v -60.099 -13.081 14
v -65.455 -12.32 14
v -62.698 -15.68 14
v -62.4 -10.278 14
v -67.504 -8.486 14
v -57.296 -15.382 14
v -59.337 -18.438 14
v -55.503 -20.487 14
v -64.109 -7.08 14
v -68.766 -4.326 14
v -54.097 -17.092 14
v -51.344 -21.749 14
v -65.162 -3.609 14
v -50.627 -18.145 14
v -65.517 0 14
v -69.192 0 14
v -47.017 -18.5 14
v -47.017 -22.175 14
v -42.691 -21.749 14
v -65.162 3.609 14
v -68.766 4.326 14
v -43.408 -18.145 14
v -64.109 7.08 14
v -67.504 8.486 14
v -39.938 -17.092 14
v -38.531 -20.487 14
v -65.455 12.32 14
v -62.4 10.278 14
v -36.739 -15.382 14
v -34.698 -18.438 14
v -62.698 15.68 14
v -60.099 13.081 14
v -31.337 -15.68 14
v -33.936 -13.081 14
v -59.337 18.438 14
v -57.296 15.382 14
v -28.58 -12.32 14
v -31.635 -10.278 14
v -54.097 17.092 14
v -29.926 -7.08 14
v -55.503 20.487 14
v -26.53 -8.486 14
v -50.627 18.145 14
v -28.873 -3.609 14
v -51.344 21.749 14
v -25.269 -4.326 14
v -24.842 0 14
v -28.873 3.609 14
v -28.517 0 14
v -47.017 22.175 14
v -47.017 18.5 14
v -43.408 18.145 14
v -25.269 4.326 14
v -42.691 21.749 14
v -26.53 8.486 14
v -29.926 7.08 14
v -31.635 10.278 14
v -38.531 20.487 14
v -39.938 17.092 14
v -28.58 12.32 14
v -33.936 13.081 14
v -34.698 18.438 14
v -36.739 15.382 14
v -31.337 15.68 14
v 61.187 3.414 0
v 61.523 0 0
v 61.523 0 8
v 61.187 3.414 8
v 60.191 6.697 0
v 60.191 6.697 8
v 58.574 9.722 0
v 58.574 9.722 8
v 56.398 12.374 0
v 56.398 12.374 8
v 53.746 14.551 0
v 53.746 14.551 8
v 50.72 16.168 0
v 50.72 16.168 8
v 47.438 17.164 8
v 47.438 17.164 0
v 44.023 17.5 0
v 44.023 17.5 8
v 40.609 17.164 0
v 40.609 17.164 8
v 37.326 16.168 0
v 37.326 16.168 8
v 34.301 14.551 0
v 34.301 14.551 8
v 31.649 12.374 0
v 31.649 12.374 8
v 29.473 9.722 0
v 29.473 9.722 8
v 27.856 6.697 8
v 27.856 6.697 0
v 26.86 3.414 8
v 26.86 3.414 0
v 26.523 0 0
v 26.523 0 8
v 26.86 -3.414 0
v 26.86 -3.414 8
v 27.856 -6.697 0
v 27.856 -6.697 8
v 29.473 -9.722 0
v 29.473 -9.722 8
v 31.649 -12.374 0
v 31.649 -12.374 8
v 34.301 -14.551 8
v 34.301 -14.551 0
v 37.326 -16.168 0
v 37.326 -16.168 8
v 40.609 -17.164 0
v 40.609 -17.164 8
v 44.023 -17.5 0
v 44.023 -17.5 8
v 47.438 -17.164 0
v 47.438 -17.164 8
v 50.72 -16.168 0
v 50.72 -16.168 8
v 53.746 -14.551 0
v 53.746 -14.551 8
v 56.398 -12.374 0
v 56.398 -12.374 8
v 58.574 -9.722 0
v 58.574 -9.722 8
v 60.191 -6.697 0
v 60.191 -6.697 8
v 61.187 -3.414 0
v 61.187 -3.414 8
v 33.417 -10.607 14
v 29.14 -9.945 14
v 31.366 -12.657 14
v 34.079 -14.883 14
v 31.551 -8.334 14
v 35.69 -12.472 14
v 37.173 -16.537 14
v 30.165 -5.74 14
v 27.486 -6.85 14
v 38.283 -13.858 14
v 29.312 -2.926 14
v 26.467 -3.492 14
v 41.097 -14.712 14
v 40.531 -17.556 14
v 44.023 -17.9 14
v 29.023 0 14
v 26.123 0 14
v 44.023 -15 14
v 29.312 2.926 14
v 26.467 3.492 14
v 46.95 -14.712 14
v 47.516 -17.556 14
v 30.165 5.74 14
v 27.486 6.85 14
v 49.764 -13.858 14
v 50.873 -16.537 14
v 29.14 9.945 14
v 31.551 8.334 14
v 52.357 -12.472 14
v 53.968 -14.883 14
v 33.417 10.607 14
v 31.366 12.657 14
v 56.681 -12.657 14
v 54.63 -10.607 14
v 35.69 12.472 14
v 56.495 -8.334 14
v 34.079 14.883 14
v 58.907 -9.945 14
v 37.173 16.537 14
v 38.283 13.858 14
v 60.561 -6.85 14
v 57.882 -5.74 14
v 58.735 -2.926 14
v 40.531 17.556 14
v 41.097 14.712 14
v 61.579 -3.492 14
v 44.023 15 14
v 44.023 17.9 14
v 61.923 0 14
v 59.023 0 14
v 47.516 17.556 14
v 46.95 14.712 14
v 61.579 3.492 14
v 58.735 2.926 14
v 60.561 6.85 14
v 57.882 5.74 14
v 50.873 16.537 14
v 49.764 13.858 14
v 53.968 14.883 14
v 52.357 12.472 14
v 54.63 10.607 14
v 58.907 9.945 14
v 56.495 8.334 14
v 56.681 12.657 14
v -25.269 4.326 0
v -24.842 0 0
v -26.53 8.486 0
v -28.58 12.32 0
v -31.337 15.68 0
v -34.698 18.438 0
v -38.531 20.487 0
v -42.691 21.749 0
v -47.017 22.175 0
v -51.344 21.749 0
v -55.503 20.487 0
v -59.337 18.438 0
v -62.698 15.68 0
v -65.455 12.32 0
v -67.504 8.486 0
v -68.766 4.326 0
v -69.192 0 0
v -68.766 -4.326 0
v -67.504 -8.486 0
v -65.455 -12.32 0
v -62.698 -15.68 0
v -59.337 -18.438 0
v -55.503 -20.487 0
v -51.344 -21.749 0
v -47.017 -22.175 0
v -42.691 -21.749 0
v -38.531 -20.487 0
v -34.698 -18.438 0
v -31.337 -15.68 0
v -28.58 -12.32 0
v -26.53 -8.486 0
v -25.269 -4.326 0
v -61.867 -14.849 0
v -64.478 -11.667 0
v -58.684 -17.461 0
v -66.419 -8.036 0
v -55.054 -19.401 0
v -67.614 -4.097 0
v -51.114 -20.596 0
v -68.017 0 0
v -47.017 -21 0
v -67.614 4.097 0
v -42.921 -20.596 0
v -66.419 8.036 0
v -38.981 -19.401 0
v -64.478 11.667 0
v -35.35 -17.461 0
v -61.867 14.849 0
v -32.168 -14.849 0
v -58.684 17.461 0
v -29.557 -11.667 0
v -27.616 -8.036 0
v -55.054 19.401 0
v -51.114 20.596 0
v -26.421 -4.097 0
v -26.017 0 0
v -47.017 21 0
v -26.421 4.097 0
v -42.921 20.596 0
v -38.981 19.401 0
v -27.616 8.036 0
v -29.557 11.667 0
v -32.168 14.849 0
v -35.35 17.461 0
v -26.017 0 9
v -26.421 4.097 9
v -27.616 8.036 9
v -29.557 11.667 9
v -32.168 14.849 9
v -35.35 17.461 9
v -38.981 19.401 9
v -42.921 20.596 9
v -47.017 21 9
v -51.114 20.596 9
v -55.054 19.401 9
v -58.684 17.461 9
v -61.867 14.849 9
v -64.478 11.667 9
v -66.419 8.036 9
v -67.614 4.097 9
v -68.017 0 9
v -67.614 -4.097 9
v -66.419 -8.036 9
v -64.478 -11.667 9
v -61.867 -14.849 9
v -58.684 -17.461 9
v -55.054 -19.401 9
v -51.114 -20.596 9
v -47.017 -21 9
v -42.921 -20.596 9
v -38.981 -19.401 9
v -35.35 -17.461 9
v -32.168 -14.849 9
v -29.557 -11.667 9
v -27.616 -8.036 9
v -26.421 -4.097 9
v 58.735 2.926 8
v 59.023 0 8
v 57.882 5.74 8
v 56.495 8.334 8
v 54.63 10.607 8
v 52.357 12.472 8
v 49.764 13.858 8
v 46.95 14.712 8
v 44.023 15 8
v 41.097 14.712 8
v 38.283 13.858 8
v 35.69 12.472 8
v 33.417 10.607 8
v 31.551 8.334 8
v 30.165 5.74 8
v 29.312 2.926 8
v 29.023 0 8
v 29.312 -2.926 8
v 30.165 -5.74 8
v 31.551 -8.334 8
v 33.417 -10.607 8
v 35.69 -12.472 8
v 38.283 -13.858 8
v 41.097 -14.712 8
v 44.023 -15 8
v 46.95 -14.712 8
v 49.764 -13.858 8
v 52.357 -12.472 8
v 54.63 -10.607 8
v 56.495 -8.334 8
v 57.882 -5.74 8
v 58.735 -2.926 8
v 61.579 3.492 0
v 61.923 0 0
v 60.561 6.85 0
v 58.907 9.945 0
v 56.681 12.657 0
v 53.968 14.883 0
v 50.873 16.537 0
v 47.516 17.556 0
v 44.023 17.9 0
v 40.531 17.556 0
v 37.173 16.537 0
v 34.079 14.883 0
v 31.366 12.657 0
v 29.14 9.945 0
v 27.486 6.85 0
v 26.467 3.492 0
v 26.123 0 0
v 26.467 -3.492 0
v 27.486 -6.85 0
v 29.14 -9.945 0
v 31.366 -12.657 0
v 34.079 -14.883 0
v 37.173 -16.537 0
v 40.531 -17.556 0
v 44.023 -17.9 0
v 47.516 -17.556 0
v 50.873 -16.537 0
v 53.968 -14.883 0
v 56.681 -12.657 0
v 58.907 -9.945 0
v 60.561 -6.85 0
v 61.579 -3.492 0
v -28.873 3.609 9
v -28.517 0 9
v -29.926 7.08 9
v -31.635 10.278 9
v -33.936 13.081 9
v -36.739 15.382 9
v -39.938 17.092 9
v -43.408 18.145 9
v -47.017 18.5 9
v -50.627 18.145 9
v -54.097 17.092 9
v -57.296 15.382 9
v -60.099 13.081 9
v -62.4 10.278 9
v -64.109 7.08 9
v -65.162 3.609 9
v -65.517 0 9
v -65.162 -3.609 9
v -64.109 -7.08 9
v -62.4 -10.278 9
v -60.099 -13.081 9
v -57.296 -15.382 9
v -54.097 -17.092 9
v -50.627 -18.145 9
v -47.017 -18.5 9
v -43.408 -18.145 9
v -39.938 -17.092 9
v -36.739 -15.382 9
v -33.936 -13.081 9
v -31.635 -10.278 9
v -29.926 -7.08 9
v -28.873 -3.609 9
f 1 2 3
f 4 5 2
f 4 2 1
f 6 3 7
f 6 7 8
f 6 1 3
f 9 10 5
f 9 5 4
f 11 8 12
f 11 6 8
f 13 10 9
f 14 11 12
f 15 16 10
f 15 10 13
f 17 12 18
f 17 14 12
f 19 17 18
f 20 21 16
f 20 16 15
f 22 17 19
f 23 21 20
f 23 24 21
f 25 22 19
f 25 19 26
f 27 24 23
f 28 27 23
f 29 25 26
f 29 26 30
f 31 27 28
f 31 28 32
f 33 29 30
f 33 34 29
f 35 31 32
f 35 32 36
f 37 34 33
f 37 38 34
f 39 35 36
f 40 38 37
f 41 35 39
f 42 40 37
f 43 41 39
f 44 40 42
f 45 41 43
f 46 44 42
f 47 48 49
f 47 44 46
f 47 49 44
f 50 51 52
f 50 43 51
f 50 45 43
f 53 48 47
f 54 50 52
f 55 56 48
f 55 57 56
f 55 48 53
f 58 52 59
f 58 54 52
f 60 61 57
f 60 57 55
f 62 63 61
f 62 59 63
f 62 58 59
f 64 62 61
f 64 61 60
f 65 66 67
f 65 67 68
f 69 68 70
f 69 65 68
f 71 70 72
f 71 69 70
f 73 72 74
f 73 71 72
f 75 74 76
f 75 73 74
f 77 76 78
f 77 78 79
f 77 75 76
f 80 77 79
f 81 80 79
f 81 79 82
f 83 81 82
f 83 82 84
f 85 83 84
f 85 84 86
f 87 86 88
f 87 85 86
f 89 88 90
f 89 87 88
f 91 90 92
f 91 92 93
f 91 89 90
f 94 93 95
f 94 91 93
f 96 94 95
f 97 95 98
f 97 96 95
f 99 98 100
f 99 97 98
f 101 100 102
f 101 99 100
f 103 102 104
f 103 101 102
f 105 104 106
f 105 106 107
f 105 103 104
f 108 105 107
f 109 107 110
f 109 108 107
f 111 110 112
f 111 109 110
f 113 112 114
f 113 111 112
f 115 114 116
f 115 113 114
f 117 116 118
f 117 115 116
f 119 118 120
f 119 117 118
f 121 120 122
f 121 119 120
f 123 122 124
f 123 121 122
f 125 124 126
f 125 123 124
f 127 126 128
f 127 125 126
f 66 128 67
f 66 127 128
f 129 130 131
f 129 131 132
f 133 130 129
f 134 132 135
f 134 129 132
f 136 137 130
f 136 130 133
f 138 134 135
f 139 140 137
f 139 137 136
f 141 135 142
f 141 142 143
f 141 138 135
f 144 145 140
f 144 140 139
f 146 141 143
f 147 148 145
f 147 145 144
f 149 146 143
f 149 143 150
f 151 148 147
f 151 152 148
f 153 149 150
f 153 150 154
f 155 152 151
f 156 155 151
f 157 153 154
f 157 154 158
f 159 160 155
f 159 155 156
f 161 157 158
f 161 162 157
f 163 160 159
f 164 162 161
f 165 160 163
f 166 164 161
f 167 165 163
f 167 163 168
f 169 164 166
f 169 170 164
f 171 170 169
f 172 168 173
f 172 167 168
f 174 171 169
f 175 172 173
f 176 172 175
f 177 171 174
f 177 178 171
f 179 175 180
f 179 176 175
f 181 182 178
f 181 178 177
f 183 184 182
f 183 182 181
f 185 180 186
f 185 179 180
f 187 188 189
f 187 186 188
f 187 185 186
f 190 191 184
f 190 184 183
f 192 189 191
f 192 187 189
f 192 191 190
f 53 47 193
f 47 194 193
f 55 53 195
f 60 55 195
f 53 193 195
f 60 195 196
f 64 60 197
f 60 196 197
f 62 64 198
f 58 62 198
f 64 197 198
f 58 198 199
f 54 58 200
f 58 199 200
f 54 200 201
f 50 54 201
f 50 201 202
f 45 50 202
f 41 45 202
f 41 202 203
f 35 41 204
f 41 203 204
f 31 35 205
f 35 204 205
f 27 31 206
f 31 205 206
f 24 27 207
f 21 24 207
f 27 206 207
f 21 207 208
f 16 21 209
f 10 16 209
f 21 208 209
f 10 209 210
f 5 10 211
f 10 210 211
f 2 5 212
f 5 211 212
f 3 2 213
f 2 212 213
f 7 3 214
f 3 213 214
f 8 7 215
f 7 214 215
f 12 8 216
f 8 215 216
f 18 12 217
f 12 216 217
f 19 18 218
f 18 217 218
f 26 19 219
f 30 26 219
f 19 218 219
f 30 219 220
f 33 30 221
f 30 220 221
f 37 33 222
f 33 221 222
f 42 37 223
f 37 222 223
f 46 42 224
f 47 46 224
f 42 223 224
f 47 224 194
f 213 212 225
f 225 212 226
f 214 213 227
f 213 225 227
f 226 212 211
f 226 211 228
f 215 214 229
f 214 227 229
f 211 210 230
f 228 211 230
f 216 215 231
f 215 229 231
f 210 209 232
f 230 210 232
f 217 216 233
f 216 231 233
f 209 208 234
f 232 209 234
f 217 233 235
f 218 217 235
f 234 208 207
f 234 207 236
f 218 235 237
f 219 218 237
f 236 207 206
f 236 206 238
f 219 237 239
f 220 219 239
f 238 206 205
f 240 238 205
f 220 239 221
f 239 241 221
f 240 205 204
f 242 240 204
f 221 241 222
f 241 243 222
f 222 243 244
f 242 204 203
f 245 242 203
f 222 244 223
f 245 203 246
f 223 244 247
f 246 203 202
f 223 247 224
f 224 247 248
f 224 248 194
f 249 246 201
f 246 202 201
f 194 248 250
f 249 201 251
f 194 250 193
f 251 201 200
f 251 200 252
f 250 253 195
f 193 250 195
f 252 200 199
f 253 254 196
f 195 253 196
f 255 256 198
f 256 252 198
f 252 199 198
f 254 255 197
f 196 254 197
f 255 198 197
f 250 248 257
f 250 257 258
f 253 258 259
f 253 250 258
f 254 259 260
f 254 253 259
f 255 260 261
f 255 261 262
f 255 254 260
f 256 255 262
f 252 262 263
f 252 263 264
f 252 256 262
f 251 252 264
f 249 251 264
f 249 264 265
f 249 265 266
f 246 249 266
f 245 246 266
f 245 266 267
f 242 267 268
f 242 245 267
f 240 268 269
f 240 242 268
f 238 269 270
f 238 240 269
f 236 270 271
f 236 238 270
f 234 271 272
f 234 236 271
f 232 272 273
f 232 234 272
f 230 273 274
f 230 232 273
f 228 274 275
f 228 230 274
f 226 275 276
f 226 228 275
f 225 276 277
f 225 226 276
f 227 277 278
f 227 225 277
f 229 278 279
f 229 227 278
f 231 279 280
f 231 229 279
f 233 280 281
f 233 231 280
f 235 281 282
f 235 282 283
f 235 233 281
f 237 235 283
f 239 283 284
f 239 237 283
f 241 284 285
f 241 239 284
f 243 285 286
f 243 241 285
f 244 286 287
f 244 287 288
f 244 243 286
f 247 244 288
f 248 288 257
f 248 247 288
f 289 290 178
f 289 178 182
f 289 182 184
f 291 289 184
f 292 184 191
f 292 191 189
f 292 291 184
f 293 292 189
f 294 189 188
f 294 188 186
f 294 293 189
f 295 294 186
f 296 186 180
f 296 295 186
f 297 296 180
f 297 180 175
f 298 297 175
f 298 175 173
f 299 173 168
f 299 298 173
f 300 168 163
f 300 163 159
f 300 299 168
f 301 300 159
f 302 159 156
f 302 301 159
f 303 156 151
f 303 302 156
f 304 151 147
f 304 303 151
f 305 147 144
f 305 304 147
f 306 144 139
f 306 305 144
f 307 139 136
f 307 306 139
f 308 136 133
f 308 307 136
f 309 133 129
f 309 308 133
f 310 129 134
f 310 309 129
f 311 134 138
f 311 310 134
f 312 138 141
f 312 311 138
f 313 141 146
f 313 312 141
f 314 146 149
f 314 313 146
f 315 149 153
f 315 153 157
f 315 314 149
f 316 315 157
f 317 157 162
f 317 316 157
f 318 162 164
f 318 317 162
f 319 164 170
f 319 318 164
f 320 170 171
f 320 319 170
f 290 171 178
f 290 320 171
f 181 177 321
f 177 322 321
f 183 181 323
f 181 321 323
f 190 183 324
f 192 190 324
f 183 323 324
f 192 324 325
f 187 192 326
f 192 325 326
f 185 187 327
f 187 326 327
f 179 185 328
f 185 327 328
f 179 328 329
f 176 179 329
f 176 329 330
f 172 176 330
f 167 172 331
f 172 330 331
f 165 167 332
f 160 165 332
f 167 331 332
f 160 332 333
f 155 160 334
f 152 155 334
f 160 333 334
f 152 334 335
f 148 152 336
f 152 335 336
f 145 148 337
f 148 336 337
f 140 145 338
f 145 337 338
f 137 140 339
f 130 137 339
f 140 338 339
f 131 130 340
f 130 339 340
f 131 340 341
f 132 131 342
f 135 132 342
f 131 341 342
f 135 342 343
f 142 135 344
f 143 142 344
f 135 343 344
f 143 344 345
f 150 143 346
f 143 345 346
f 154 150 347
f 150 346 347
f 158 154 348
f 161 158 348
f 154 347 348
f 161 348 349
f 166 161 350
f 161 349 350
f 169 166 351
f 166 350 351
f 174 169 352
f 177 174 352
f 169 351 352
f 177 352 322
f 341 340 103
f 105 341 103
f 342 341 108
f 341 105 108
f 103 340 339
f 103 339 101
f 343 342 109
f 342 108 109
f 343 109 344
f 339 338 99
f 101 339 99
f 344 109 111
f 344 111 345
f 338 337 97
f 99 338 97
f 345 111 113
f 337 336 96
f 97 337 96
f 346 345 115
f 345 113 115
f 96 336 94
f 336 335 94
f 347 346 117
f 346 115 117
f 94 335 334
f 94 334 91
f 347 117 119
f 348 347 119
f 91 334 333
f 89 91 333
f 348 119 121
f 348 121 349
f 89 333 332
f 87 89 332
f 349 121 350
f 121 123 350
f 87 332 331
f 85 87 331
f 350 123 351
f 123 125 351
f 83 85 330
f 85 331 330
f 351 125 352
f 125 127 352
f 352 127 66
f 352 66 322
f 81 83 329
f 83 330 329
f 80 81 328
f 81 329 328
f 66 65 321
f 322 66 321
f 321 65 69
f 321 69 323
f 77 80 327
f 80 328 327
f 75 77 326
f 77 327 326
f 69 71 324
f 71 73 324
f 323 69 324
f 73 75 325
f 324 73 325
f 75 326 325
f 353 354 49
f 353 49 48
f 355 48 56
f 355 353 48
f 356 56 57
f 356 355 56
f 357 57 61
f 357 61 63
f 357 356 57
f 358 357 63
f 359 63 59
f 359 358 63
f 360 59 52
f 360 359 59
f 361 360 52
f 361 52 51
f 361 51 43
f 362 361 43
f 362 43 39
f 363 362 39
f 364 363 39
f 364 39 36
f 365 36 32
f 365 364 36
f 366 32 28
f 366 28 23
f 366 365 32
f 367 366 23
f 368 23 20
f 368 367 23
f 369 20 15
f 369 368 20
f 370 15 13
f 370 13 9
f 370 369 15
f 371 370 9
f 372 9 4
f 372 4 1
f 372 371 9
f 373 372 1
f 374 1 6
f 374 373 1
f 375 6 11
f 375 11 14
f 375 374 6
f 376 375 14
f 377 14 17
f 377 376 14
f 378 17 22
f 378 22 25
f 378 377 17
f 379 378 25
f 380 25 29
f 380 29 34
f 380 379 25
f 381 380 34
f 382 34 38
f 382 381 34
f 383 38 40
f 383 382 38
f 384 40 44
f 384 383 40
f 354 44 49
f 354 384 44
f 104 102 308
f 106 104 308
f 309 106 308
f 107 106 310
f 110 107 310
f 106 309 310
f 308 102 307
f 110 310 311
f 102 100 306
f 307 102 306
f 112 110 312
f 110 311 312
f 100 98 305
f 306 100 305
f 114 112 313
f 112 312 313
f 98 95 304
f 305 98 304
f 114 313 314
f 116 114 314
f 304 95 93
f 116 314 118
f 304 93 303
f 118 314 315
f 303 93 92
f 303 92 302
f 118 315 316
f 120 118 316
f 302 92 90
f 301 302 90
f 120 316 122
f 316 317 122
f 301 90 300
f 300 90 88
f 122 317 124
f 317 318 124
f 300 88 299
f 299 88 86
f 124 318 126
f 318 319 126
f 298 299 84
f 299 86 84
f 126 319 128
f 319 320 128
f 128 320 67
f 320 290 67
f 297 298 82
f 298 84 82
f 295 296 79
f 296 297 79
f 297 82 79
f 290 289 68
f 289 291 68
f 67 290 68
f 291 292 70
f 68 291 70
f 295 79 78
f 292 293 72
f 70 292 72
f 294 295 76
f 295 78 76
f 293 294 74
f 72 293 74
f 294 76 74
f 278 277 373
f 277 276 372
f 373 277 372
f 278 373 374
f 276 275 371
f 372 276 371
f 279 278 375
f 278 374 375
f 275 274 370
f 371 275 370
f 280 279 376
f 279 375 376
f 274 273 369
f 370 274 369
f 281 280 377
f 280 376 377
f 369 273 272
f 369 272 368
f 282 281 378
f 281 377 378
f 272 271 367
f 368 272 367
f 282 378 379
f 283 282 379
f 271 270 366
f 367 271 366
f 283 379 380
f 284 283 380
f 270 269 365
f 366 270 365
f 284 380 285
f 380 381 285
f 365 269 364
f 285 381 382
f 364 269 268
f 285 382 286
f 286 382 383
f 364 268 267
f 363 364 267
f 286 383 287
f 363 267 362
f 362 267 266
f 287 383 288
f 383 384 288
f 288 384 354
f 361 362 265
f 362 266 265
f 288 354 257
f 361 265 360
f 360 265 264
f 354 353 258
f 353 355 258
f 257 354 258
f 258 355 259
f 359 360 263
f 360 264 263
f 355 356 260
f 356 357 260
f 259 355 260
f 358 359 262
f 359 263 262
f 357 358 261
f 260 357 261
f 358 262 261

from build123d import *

# Parameters (mm, degrees)
F0_R     = 22.175
F0_R_2   = 21
F1_DEPTH = 9
F0_R_3   = 17.9
F0_R_4   = 17.5
F2_DEPTH = 8
F3_R     = 22.175
F3_R_2   = 21
F3_R_3   = 18.5
F4_DEPTH = 5
F5_R     = 17.9
F5_R_2   = 15
F6_DEPTH = 6


with BuildPart() as f1:
    # F0 (on Top) → F1 (new body)
    with BuildSketch(Plane.XY):
        with Locations((-47.0174653526, 0)):
            Circle(F0_R)
        with Locations((-47.0174653526, 0)):
            Circle(F0_R_2, mode=Mode.SUBTRACT)
    extrude(amount=F1_DEPTH)

    # F3 (on face) → F4 (join)
    with BuildSketch(Plane.XY.offset(9)):
        with Locations((-47.0174653526, 0)):
            Circle(F3_R)
        with Locations((-47.0174653526, 0)):
            Circle(F3_R_2, mode=Mode.SUBTRACT)
        with Locations((-47.0174653526, 0)):
            Circle(F3_R_2)
        with Locations((-47.0174653526, 0)):
            Circle(F3_R_3, mode=Mode.SUBTRACT)
    extrude(amount=F4_DEPTH)


with BuildPart() as f2:
    # F0 (on Top) → F2 (new body)
    with BuildSketch(Plane.XY):
        with Locations((44.0234315433, 0)):
            Circle(F0_R_3)
        with Locations((44.0234315433, 0)):
            Circle(F0_R_4, mode=Mode.SUBTRACT)
    extrude(amount=F2_DEPTH)

    # F5 (on face) → F6 (join)
    with BuildSketch(Plane.XY.offset(8)):
        with Locations((44.0234315433, 0)):
            Circle(F5_R)
        with Locations((44.0234315433, 0)):
            Circle(F5_R_2, mode=Mode.SUBTRACT)
    extrude(amount=F6_DEPTH)


solid = Compound([f1.part, f2.part])
